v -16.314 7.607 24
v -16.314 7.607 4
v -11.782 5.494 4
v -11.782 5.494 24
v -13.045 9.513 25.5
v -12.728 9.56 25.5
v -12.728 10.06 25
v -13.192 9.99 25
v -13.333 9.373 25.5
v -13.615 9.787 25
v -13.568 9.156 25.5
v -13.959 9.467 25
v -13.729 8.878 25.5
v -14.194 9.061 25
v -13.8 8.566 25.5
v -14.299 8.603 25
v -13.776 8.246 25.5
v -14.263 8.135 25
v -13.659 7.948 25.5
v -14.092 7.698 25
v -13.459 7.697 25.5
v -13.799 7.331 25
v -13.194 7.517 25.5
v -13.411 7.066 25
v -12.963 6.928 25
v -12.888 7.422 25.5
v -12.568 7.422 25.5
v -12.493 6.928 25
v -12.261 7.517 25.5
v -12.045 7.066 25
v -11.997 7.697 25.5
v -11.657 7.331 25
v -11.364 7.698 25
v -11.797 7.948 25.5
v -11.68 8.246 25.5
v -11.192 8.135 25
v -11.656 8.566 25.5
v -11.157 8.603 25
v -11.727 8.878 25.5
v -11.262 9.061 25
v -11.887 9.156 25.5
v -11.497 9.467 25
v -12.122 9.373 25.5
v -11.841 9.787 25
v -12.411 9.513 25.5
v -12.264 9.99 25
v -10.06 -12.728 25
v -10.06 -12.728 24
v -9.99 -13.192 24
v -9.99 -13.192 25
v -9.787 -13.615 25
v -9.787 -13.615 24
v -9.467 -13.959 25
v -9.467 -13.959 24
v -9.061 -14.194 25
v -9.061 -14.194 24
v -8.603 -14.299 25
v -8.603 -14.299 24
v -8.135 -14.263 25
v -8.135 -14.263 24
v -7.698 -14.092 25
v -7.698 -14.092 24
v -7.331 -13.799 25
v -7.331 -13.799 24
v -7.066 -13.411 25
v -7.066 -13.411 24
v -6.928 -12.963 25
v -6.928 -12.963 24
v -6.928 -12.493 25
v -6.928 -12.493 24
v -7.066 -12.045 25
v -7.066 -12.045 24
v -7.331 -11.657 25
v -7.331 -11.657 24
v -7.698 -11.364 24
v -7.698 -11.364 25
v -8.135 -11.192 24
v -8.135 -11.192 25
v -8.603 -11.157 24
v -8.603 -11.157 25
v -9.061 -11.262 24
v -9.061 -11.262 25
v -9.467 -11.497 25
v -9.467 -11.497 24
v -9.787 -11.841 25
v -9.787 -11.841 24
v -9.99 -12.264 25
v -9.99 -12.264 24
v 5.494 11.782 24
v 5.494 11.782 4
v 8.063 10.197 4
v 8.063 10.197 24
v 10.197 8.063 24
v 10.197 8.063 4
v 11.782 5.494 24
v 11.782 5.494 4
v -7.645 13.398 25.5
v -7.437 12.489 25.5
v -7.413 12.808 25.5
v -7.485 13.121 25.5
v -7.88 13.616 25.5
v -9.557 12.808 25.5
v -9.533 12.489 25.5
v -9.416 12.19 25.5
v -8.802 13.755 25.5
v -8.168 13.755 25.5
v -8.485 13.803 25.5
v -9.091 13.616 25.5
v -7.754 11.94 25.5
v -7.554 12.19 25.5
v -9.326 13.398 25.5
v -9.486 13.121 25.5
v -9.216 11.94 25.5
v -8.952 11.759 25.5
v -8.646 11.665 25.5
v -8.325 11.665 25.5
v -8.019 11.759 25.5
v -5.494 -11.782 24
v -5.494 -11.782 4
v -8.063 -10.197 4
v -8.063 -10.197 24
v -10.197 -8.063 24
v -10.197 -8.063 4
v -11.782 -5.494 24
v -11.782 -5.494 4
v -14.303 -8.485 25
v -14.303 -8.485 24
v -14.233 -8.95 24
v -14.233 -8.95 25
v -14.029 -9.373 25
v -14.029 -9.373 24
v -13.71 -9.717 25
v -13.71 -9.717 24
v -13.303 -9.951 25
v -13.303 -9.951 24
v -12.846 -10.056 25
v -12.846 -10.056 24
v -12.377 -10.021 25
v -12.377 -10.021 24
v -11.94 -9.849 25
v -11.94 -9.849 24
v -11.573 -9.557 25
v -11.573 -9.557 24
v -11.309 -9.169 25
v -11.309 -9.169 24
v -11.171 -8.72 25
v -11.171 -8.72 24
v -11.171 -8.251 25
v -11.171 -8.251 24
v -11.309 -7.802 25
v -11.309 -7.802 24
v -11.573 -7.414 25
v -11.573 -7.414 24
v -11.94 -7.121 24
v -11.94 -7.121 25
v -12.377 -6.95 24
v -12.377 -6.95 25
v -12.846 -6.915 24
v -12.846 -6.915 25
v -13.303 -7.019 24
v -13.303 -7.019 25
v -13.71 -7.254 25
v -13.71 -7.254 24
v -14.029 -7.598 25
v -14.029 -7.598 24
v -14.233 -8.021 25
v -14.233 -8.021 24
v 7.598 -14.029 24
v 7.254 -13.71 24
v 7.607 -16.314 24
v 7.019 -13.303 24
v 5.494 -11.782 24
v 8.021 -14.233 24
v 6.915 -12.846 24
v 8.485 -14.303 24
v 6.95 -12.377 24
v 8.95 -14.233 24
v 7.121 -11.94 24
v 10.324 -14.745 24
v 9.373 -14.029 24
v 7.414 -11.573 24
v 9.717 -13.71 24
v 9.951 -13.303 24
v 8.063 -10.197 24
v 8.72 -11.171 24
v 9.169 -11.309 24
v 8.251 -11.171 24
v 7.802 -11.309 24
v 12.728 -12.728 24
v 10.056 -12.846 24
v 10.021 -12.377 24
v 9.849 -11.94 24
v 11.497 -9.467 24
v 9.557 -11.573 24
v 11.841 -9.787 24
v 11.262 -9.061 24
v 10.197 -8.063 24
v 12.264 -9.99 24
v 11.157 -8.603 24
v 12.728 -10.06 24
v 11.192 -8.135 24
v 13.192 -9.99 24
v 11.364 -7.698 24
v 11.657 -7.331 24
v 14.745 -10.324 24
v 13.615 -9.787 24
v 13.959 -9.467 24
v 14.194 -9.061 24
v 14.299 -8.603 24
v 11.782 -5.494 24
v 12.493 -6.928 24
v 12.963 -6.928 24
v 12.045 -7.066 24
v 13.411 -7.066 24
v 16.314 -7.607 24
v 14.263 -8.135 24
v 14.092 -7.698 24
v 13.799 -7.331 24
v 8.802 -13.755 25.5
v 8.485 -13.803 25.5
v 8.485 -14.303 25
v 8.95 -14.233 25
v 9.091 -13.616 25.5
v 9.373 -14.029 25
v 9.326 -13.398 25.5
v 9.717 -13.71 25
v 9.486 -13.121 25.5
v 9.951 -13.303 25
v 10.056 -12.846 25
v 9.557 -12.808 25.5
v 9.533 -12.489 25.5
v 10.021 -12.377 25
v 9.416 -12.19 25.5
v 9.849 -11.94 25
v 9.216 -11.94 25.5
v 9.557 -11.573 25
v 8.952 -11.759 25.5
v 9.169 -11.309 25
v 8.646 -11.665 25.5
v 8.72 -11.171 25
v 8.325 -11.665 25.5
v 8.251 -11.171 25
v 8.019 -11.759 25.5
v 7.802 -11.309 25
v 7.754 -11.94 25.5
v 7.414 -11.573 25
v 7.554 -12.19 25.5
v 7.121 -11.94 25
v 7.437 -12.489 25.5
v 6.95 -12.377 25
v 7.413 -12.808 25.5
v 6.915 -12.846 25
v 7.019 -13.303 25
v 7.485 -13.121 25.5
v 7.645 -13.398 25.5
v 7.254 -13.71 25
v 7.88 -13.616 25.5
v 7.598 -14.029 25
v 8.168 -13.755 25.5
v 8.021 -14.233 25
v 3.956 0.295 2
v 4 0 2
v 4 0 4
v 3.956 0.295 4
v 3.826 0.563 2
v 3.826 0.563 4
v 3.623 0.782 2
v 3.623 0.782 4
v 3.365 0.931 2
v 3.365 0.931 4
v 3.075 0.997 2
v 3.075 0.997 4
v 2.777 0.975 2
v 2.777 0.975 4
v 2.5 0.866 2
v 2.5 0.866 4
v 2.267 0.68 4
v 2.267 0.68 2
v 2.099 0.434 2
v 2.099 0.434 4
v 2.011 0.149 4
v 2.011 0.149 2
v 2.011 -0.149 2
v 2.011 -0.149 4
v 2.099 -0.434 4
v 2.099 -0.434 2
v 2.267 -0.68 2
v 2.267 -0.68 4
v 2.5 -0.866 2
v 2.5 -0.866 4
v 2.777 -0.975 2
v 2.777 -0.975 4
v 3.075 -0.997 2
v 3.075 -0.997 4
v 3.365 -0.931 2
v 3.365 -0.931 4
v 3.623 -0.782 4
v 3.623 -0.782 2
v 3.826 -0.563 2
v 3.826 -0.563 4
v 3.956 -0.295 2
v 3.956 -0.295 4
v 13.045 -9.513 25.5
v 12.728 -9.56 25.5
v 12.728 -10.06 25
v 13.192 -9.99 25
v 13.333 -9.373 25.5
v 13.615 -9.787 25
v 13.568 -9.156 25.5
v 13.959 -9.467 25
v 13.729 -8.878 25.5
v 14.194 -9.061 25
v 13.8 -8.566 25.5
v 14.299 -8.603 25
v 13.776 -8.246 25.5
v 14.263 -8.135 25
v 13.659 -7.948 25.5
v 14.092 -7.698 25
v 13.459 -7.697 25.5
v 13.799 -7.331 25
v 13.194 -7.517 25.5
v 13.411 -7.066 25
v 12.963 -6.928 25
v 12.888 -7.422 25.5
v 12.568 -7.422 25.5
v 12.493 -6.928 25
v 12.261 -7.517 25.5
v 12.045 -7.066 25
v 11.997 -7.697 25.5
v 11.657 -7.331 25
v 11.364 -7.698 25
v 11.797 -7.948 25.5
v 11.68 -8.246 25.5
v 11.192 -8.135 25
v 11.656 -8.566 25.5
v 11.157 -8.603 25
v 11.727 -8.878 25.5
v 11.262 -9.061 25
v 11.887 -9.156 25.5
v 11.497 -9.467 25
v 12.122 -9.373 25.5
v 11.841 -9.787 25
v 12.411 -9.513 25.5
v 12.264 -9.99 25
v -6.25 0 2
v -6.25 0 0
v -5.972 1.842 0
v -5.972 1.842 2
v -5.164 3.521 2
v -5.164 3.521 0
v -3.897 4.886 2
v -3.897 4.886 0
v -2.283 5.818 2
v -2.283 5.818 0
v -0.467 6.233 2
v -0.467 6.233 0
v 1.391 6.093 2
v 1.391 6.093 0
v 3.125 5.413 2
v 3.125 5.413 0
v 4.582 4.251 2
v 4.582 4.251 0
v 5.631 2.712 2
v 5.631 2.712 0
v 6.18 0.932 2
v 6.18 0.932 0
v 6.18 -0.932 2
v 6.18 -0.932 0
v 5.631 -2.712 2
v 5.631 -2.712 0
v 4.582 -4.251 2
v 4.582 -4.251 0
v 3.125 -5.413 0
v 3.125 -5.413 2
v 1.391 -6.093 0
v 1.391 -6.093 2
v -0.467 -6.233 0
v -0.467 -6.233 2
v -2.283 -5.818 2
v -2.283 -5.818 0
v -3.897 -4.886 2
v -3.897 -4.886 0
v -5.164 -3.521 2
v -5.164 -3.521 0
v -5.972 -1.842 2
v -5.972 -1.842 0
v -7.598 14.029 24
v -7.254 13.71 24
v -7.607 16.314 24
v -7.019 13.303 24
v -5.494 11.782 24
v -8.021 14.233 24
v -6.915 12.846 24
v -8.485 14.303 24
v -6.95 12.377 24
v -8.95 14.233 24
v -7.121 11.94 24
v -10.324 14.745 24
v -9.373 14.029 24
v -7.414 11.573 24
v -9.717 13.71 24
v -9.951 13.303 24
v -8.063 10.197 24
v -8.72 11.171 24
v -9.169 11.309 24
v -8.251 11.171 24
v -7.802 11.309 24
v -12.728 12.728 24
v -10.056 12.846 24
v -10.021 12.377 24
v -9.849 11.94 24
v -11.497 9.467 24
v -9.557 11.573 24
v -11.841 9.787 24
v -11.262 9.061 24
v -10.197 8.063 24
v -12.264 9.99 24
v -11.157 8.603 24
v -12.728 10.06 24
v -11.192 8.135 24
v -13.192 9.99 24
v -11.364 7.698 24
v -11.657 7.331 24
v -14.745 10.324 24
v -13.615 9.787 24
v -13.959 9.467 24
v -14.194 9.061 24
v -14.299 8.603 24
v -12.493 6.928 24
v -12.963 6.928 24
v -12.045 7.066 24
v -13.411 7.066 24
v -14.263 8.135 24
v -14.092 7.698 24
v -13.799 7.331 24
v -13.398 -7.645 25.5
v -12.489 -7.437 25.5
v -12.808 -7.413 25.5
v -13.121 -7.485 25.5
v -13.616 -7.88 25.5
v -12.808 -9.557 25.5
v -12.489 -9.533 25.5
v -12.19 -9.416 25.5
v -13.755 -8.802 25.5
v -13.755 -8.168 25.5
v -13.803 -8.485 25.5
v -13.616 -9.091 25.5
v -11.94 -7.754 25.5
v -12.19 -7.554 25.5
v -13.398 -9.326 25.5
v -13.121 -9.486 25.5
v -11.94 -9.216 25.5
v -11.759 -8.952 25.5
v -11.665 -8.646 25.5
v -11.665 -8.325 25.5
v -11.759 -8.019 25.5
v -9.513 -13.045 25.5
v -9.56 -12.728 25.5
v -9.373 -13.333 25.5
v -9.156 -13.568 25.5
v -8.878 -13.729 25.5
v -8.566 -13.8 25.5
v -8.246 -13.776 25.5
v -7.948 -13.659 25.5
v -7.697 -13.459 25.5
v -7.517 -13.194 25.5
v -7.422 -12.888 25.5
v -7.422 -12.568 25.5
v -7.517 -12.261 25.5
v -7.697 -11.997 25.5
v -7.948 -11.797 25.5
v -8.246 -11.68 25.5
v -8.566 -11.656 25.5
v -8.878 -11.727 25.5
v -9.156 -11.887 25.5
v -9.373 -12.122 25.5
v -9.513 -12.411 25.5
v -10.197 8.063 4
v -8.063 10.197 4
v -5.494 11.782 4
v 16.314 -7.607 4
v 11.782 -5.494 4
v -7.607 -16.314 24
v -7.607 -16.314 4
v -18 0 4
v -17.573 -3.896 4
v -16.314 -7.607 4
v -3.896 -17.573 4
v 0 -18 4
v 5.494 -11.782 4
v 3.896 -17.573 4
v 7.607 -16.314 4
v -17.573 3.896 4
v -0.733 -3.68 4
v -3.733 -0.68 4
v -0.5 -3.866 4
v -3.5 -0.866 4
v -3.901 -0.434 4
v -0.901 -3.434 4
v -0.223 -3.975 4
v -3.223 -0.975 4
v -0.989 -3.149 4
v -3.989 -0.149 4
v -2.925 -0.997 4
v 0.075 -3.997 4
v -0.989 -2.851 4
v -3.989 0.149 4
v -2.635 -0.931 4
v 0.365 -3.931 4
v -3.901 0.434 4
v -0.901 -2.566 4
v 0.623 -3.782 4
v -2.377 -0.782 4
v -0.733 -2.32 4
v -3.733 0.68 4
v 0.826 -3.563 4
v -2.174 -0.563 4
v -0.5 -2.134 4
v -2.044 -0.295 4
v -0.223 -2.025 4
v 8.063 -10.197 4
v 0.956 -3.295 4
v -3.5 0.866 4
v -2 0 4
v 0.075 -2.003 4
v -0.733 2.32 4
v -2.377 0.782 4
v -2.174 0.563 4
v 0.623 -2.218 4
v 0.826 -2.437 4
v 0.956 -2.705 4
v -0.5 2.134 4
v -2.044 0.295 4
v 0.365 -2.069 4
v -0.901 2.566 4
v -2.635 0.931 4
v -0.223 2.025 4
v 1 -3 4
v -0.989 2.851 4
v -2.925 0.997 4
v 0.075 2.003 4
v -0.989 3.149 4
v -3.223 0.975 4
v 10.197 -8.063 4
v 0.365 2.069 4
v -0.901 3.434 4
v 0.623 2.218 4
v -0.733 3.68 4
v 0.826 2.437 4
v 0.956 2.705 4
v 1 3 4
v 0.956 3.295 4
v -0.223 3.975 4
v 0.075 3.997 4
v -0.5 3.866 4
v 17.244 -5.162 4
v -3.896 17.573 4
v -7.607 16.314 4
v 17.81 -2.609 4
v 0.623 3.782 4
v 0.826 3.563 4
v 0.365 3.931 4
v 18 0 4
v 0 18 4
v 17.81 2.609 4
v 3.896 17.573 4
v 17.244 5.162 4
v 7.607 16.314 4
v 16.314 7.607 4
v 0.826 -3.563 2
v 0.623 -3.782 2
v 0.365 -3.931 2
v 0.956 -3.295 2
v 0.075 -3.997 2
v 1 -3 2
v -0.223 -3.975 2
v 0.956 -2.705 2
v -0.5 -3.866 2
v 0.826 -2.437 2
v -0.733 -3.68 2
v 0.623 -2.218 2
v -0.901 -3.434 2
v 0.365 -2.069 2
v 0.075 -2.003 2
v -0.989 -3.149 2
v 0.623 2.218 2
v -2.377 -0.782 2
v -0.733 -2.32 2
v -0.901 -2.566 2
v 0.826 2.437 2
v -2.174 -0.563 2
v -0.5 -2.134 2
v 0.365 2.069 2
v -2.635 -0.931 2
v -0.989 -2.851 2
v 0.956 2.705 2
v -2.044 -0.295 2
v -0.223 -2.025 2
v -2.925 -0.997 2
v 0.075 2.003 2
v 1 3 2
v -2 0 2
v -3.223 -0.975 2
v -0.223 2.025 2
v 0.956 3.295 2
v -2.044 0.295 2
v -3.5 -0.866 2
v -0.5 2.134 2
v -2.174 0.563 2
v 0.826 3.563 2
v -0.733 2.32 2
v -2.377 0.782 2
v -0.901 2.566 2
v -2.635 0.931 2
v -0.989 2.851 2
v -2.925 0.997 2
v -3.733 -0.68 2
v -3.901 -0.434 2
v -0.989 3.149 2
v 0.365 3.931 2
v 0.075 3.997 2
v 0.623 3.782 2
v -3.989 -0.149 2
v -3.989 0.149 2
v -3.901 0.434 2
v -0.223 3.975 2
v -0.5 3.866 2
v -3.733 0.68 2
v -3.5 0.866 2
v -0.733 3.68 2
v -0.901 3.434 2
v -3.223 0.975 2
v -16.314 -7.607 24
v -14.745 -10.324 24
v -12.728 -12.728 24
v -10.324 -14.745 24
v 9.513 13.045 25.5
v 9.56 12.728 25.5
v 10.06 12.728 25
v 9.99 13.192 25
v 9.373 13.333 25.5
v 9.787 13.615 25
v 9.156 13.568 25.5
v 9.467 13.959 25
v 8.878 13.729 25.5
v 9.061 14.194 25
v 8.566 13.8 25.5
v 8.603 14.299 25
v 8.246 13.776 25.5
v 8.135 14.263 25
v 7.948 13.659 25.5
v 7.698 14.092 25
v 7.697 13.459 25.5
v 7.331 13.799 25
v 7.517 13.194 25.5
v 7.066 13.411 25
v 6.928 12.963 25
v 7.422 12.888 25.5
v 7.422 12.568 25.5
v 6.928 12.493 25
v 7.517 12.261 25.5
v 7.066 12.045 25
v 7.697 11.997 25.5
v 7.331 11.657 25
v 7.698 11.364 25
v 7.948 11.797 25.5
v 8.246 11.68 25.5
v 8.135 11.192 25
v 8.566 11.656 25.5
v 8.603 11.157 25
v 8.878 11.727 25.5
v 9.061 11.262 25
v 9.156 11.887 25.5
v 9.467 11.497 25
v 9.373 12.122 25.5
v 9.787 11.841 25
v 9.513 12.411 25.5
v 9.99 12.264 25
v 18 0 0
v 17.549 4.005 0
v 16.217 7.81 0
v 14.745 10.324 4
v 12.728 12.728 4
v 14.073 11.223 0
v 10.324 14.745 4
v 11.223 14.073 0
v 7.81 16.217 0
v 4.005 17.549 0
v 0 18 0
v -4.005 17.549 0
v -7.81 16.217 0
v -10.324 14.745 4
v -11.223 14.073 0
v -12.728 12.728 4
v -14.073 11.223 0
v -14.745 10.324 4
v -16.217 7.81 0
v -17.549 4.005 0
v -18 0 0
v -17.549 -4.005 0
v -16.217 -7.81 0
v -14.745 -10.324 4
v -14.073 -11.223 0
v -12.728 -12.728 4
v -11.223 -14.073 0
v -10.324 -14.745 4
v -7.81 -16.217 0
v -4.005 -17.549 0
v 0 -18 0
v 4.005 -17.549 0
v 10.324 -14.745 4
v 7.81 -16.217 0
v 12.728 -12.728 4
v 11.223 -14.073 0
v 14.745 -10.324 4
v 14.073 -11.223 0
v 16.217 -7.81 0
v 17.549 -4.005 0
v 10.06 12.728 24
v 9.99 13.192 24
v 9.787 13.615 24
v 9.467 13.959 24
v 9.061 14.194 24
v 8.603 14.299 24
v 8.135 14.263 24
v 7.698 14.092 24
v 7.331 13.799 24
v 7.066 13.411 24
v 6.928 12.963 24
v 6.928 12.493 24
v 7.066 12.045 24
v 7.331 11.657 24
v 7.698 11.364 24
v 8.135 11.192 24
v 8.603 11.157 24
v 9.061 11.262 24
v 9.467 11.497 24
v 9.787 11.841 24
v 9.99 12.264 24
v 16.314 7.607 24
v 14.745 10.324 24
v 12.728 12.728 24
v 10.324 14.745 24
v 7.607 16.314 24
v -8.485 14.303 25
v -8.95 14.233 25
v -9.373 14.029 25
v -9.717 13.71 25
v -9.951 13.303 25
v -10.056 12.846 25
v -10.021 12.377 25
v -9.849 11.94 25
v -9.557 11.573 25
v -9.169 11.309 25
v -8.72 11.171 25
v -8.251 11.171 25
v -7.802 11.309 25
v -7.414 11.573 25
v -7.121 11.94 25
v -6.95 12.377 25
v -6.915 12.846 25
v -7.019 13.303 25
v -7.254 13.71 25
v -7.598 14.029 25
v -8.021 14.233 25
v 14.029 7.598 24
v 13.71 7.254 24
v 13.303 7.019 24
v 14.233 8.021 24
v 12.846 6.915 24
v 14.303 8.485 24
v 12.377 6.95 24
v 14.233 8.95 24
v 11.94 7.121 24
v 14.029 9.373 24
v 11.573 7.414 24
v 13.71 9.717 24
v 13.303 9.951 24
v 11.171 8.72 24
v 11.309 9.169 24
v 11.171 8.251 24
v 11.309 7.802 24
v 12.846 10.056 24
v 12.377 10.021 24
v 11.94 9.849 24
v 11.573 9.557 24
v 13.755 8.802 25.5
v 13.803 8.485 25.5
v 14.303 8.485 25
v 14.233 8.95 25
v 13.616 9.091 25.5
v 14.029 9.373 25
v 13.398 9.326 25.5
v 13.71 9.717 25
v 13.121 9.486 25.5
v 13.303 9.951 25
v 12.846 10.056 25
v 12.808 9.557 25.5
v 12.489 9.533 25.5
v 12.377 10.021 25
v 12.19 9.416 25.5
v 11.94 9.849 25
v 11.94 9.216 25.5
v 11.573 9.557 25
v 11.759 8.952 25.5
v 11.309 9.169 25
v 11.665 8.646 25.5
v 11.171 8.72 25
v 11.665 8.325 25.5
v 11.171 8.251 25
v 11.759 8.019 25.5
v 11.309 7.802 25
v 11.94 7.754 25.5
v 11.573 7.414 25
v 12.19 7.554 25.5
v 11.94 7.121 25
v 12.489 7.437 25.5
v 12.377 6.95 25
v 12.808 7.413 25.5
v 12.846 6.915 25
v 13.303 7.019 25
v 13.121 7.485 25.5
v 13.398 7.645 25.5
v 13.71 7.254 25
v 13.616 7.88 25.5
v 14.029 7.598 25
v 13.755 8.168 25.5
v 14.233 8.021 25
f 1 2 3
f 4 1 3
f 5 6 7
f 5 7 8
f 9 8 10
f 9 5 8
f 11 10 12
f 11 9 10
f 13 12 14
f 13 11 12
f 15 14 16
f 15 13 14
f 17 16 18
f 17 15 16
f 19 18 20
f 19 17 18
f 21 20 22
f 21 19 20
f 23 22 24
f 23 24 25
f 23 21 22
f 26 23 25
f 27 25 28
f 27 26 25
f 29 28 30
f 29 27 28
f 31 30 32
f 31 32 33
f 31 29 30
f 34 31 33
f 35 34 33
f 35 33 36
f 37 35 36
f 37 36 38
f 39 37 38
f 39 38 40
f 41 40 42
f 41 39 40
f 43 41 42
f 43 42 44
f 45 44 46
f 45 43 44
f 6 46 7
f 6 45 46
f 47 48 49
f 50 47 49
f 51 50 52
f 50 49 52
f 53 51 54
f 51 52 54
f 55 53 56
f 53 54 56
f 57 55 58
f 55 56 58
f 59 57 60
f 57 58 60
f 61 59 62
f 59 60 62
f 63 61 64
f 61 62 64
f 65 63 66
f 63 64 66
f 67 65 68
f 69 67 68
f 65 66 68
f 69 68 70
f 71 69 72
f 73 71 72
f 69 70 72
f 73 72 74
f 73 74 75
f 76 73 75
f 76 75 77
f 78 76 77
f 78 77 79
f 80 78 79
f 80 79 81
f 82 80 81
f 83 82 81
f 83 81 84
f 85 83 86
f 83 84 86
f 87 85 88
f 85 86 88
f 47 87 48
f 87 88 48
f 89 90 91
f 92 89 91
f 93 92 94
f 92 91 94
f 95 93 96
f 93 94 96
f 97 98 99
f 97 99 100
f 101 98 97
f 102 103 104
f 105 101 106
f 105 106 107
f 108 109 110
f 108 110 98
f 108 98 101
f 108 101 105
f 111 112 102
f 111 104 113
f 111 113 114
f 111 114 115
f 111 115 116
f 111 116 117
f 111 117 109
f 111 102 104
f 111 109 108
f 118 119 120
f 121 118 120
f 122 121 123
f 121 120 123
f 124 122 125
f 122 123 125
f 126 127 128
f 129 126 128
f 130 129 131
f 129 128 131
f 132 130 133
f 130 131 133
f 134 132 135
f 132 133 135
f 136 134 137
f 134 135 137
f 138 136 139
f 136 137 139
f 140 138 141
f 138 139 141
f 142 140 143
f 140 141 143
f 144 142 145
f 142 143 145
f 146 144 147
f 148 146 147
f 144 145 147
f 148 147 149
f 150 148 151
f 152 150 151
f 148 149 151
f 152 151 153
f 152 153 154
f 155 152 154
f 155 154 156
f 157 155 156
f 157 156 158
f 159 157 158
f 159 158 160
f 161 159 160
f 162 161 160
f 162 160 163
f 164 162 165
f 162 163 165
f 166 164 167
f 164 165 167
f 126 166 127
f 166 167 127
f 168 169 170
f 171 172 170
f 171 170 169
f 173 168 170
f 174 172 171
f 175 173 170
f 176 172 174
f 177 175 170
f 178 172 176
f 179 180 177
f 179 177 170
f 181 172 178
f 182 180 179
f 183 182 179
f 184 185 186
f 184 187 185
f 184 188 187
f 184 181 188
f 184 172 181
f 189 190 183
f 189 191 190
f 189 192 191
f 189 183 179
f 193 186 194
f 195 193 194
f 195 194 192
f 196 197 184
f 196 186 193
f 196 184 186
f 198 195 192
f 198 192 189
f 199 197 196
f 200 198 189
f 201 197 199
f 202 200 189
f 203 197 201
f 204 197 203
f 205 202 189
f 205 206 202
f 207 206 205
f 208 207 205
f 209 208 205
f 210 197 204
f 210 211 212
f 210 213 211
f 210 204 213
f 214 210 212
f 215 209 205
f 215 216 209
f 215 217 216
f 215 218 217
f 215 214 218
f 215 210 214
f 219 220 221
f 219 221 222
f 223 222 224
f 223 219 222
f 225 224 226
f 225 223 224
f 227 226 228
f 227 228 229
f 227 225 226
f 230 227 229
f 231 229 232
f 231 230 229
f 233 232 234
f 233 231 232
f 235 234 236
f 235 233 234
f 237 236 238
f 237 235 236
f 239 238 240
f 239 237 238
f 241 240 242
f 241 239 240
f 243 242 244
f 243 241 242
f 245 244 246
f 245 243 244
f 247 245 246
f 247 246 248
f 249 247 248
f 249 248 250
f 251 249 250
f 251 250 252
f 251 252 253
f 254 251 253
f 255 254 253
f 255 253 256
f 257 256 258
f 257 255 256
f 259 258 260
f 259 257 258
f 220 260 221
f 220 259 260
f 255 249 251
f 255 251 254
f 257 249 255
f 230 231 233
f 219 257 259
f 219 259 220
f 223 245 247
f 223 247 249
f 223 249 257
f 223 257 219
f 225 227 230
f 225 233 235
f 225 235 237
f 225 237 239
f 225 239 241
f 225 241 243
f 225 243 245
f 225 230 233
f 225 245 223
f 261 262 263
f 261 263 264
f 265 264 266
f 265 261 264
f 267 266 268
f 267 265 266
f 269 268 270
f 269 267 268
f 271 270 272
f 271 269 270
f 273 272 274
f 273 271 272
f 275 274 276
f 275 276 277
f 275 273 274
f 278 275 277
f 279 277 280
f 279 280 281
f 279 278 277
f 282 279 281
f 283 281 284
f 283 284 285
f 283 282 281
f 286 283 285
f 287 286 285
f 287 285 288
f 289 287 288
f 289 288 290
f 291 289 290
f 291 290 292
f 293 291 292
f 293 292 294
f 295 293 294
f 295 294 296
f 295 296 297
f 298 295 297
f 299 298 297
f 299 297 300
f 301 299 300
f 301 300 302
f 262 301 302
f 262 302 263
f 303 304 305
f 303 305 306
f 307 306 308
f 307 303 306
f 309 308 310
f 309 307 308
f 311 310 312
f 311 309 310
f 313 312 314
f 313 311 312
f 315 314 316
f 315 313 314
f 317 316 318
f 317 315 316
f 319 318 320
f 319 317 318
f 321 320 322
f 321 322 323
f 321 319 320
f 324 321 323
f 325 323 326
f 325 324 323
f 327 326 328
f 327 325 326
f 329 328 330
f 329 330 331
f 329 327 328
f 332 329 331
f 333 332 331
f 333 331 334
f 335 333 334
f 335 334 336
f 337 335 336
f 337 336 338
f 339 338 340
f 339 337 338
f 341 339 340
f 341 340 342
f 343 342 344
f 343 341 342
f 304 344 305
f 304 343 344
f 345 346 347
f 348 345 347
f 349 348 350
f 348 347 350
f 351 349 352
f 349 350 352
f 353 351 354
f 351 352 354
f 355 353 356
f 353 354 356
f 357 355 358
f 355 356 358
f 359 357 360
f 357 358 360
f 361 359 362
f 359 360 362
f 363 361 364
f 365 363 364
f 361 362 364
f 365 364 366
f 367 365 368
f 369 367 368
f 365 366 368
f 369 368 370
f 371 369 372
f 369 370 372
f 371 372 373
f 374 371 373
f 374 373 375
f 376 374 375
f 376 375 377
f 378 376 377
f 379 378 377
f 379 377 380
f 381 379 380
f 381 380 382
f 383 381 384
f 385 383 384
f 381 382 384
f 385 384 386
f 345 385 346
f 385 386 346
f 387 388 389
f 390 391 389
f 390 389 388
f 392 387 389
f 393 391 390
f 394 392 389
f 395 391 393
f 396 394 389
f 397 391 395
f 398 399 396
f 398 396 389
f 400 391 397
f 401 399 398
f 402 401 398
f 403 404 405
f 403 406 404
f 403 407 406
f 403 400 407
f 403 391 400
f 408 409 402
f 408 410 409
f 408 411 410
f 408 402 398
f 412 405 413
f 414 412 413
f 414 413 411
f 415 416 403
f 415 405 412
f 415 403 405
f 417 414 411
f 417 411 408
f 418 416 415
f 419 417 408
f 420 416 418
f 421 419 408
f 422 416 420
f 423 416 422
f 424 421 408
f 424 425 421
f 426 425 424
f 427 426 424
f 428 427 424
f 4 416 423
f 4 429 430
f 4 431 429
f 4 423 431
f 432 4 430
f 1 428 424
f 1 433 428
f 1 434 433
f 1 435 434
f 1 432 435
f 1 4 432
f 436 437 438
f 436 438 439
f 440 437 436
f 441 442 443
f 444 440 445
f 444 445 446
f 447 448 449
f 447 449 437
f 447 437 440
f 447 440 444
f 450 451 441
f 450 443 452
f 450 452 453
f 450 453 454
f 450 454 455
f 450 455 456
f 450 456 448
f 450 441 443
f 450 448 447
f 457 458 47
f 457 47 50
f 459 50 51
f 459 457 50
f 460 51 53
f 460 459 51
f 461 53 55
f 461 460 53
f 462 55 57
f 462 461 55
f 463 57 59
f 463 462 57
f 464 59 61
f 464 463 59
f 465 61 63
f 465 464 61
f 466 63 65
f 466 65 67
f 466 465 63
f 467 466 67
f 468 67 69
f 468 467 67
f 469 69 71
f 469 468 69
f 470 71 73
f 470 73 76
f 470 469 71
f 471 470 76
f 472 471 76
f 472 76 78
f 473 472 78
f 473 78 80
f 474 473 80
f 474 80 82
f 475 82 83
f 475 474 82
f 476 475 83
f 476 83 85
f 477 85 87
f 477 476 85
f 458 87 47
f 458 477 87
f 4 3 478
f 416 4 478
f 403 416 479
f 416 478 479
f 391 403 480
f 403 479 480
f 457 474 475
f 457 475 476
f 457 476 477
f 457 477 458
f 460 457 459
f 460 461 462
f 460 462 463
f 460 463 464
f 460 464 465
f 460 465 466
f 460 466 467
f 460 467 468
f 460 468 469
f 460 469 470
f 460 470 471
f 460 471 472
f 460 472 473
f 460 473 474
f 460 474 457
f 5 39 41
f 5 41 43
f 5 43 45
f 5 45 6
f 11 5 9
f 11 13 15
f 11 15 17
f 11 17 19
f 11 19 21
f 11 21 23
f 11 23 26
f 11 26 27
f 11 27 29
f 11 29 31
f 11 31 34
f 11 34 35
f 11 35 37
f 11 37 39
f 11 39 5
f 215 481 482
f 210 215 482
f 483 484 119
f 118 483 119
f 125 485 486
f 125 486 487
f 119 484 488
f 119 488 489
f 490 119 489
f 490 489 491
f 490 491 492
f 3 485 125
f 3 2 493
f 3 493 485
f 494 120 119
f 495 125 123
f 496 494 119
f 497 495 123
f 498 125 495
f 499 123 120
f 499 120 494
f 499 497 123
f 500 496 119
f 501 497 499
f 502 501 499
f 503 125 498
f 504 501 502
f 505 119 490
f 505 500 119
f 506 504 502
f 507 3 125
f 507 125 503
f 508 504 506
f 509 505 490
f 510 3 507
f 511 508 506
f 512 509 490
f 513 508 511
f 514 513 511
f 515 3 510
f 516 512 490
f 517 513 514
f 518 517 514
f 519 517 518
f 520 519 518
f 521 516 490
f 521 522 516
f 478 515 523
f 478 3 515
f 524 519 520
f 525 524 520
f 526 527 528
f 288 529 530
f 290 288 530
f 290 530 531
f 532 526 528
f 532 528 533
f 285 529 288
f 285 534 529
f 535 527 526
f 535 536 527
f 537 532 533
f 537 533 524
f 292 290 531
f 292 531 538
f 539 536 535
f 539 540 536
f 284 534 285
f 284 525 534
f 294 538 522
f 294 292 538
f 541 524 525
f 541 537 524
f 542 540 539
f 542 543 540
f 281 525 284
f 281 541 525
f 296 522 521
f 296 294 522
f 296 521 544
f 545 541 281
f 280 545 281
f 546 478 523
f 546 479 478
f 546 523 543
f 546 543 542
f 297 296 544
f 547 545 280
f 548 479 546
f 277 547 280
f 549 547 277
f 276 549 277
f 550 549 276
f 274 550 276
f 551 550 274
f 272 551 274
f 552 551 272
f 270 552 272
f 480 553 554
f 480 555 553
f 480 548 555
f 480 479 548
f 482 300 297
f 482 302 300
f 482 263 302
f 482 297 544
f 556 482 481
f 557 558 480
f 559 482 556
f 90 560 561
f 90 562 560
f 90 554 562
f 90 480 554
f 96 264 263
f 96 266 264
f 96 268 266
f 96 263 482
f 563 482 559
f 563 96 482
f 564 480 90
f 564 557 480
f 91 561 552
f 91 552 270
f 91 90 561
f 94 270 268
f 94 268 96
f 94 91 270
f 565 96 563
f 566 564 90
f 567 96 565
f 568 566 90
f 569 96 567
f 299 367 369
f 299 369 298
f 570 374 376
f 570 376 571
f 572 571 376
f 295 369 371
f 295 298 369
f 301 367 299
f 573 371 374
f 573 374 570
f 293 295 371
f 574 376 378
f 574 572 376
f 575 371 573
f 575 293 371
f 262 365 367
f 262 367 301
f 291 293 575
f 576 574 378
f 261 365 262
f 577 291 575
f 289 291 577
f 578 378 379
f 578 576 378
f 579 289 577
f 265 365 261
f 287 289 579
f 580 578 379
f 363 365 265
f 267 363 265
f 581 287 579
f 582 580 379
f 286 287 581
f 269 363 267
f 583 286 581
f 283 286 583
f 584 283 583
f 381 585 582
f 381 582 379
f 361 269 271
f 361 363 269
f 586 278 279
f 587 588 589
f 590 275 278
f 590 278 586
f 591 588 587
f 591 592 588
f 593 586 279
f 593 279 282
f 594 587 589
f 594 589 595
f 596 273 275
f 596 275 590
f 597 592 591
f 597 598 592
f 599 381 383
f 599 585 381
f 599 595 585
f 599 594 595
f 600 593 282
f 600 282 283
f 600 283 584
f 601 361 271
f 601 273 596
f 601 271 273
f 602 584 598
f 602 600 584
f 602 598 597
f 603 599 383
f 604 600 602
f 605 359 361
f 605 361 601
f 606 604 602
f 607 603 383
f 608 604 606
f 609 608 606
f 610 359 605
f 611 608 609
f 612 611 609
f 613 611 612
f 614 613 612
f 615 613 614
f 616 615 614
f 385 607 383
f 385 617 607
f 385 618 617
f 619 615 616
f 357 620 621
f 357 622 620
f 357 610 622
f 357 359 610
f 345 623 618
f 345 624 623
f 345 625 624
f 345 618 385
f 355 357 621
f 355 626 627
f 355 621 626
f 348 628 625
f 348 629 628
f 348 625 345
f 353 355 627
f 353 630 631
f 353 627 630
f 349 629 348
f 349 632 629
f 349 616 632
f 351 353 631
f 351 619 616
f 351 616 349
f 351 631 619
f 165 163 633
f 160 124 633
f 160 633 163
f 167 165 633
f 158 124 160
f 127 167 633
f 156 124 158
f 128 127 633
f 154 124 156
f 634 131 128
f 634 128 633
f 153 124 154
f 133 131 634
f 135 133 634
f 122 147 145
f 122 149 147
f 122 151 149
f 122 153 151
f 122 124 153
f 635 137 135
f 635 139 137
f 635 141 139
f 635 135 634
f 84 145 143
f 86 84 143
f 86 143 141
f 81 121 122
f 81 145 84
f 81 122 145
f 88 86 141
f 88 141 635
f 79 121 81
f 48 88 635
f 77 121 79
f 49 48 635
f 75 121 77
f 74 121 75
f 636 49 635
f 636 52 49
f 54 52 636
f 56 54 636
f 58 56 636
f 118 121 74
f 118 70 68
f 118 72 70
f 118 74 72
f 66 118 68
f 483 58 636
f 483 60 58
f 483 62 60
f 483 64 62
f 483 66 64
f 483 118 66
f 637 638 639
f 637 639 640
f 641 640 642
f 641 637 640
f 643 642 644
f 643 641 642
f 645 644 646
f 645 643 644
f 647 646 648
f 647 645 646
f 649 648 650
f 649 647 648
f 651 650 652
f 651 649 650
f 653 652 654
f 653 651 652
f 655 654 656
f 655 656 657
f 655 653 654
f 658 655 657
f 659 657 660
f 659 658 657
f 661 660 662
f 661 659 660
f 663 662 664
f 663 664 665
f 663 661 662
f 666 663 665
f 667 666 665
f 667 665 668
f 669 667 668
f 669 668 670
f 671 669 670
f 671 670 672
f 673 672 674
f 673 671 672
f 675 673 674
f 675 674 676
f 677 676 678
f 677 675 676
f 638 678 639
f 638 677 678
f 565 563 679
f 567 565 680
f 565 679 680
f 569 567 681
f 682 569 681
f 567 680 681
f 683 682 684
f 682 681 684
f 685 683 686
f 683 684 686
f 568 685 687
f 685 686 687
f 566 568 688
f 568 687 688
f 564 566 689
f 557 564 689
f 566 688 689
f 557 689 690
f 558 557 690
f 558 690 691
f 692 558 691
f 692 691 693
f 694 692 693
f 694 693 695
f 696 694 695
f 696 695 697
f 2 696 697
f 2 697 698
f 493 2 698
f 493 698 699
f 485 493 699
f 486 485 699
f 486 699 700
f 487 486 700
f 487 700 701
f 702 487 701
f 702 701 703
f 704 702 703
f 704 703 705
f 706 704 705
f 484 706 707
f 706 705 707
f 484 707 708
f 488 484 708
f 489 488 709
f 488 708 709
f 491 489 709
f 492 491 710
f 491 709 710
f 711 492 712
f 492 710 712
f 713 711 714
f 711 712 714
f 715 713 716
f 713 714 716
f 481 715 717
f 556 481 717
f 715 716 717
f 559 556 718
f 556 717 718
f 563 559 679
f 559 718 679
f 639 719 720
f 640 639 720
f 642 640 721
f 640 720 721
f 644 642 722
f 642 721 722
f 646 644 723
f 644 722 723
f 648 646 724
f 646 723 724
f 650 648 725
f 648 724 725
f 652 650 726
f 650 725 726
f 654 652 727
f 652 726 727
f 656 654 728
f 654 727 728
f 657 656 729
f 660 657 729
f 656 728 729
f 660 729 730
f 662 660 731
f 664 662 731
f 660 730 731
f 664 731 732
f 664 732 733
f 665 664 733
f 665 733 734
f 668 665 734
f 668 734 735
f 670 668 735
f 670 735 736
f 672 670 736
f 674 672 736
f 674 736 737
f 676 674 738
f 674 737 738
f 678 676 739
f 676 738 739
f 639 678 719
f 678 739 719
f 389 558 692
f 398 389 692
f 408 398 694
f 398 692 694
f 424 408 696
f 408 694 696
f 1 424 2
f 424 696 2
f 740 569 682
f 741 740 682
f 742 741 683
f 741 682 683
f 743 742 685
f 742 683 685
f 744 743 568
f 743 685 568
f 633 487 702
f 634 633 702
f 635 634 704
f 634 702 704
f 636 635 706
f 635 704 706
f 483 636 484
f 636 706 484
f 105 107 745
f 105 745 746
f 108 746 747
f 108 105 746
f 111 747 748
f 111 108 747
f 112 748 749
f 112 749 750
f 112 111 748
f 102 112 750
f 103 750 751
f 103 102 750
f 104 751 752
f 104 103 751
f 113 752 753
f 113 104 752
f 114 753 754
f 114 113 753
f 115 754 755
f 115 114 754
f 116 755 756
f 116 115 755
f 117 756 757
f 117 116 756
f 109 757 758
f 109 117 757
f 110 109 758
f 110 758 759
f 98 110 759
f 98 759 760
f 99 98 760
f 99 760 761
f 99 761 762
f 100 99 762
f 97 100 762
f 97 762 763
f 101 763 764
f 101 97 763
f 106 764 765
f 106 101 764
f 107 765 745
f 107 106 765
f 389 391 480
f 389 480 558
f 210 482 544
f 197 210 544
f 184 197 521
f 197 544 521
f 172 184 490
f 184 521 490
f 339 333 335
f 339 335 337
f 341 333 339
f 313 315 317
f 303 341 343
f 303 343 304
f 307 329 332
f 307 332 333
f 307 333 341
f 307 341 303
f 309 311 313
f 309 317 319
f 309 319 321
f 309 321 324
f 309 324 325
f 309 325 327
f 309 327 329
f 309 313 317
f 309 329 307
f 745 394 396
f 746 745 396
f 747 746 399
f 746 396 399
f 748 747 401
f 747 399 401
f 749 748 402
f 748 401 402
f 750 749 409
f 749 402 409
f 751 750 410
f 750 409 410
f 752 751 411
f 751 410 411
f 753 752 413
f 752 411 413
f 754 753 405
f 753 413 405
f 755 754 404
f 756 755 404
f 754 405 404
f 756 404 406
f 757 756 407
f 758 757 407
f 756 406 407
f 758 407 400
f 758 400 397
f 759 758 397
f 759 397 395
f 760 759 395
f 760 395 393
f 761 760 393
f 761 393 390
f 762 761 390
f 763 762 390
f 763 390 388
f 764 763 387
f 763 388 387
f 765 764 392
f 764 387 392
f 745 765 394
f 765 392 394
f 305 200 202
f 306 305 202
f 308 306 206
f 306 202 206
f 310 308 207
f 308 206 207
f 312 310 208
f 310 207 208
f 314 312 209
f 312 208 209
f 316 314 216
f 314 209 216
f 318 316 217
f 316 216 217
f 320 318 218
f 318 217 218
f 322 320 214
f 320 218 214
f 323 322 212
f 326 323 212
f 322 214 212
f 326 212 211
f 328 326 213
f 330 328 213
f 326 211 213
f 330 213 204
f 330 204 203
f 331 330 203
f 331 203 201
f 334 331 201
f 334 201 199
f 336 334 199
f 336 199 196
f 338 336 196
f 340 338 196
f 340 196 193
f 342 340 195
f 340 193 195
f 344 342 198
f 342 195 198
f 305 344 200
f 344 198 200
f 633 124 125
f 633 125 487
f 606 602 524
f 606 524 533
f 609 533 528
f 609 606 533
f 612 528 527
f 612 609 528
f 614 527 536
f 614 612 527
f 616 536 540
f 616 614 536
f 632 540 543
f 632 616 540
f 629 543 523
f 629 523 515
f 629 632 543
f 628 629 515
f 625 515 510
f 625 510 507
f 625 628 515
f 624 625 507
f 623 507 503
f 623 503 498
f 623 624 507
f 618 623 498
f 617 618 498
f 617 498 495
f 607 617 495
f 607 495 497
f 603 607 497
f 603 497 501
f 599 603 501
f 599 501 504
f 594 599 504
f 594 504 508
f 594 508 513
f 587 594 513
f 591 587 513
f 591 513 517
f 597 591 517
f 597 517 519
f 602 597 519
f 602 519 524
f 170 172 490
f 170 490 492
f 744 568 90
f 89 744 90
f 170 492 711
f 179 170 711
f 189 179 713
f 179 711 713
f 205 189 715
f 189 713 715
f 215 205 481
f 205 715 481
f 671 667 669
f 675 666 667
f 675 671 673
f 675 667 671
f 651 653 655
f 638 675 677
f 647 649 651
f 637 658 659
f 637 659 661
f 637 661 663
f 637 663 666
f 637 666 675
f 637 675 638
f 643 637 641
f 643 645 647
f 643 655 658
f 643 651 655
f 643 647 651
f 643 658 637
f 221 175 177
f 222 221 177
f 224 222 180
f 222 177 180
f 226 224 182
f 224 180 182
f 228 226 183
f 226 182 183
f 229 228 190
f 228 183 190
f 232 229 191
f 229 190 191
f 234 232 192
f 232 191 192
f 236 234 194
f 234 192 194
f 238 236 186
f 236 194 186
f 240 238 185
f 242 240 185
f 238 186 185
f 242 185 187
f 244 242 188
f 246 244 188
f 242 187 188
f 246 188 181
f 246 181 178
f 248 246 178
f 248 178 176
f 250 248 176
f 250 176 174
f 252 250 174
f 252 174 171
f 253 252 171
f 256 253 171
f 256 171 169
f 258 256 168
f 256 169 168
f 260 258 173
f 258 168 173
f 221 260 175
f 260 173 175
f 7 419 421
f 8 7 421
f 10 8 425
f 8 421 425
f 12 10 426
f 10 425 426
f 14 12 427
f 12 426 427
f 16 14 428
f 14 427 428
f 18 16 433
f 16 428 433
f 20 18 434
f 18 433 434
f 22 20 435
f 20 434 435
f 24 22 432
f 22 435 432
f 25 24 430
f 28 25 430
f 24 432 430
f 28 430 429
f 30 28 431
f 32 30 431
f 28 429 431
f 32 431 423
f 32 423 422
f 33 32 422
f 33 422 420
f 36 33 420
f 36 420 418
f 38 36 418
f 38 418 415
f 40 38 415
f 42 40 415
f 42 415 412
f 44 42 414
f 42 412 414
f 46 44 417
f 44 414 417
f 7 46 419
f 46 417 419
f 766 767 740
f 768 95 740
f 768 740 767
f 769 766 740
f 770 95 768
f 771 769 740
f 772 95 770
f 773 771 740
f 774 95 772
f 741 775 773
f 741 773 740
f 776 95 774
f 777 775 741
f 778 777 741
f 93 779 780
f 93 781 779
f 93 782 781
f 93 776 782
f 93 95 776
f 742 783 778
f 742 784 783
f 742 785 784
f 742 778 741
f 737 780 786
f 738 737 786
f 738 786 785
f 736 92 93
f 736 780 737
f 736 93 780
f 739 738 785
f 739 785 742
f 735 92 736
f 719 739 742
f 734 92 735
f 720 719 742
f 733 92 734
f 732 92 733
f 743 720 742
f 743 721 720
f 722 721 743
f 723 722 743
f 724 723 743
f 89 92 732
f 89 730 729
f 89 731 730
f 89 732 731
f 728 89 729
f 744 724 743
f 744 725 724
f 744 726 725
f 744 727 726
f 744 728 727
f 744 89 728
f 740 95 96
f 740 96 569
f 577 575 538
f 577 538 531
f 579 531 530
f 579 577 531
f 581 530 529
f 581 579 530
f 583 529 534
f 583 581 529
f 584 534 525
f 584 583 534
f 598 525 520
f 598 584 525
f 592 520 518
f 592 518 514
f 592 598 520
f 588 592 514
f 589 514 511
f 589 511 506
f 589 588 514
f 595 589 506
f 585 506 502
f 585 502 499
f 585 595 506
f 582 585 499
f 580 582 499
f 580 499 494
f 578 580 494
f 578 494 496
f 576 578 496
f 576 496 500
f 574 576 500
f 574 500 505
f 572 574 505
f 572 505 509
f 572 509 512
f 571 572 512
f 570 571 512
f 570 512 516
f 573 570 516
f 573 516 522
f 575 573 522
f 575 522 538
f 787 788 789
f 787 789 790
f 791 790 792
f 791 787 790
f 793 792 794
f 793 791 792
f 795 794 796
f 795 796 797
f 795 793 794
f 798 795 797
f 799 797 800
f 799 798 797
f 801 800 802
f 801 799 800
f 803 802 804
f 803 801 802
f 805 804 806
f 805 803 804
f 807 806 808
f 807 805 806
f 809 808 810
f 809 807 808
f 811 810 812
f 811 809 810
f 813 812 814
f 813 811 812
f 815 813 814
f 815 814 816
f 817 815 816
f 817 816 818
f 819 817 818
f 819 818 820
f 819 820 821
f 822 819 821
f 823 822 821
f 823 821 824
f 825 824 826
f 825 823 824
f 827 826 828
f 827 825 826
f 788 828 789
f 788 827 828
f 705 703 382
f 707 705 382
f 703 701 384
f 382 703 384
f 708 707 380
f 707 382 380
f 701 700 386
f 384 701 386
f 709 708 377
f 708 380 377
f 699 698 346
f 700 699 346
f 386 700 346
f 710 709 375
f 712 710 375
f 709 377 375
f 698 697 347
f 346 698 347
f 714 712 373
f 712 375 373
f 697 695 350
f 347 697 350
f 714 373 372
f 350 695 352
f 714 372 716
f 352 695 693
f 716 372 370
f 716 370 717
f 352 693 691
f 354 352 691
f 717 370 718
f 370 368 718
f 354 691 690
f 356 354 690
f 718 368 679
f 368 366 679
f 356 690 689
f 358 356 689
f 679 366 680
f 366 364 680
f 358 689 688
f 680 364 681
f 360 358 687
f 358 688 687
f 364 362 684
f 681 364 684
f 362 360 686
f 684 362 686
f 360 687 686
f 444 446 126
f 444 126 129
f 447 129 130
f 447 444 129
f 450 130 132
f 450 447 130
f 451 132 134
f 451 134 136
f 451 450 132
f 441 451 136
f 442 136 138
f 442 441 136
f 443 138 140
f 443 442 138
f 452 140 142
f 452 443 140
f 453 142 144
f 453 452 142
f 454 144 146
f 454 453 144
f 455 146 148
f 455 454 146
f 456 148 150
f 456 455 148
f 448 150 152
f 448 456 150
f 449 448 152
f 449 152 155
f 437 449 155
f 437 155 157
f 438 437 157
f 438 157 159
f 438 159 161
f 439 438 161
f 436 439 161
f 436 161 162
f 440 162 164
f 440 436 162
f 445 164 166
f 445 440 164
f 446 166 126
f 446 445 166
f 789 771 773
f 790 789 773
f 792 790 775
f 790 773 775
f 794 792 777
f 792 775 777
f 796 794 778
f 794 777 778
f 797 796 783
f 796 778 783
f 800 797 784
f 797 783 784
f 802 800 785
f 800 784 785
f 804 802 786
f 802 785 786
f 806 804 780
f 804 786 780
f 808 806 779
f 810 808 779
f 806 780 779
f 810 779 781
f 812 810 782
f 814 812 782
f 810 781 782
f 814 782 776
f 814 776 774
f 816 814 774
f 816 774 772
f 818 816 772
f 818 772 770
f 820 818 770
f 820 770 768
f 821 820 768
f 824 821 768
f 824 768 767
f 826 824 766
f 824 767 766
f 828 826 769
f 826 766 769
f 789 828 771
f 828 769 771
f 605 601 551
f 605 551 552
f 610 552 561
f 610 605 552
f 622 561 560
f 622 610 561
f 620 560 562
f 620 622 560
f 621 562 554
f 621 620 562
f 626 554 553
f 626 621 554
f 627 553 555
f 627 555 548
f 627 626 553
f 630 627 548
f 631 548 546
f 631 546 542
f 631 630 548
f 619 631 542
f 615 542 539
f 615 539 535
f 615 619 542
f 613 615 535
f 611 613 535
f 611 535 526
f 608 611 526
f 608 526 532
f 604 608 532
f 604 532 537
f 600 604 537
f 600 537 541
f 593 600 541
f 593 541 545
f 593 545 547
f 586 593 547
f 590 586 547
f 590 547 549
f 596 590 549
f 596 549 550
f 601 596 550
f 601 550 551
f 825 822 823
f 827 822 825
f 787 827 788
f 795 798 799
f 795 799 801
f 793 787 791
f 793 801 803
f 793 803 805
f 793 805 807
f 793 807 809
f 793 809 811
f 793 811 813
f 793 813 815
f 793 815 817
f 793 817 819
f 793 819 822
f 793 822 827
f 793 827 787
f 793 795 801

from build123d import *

# Parameters (mm, degrees)
SKETCH_1_R               = 18
SKETCH_1_R_2             = 1
EXTRUDE_1_DEPTH          = 4
EXTRUDE_2_DEPTH          = 20
PATTERN_CIRCULAR_1_COUNT = 4
SKETCH_3_R               = 1.575
EXTRUDE_3_DEPTH          = 1.5
PATTERN_CIRCULAR_2_COUNT = 4
SKETCH_4_R               = 6.25
CUT_EXTRUDE_1_DEPTH      = 2
CHAMFER_1_SIZE           = 0.5


with BuildPart() as part:
    # ｽｹｯﾁ1 → ﾎﾞｽ - 押し出し1 (new body)
    with BuildSketch(Plane.XY):
        Circle(SKETCH_1_R)
        with Locations((0, 3)):
            Circle(SKETCH_1_R_2, mode=Mode.SUBTRACT)
        with Locations((3, 0)):
            Circle(SKETCH_1_R_2, mode=Mode.SUBTRACT)
        with Locations((0, -3)):
            Circle(SKETCH_1_R_2, mode=Mode.SUBTRACT)
        with Locations((-3, 0)):
            Circle(SKETCH_1_R_2, mode=Mode.SUBTRACT)
    extrude(amount=EXTRUDE_1_DEPTH)

    # ｽｹｯﾁ2 → ﾎﾞｽ - 押し出し2 (add)
    with BuildSketch(Plane.XY.offset(4)):
        with BuildLine():
            Line((16.313540167, -7.607128711), (11.782001231, -5.494037403))
            ThreePointArc((11.782001231, -5.494037403), (9.192388155, -9.192388155), (5.494037403, -11.782001231))
            Line((5.494037403, -11.782001231), (7.607128711, -16.313540167))
            ThreePointArc((7.607128711, -16.313540167), (12.727922061, -12.727922061), (16.313540167, -7.607128711))
        make_face()
    extrude_2 = extrude(amount=EXTRUDE_2_DEPTH)

    # 円形ﾊﾟﾀｰﾝ1: ﾎﾞｽ - 押し出し2 ×4 about axis
    pattern_circular_1_axis = Axis((0, 0, 24), (0, 0, -1))
    for i in range(1, PATTERN_CIRCULAR_1_COUNT):
        add(extrude_2.rotate(pattern_circular_1_axis, i * 360 / PATTERN_CIRCULAR_1_COUNT))

    # ｽｹｯﾁ3 → ﾎﾞｽ - 押し出し3 (add)
    with BuildSketch(Plane.XY.offset(24)):
        with Locations((8.485281374, 12.727922061)):
            Circle(SKETCH_3_R)
        with Locations((12.727922061, 8.485281374)):
            Circle(SKETCH_3_R)
    extrude_3 = extrude(amount=EXTRUDE_3_DEPTH)

    # 円形ﾊﾟﾀｰﾝ2: ﾎﾞｽ - 押し出し3 ×4 about axis
    pattern_circular_2_axis = Axis((0, 0, 0), (0, 0, 1))
    for i in range(1, PATTERN_CIRCULAR_2_COUNT):
        add(extrude_3.rotate(pattern_circular_2_axis, i * 360 / PATTERN_CIRCULAR_2_COUNT))

    # ｽｹｯﾁ4 → ｶｯﾄ - 押し出し1 (cut)
    with BuildSketch(Plane(origin=(0, 0, 0), x_dir=(-1, 0, 0), z_dir=(0, 0, -1))):
        Circle(SKETCH_4_R)
    extrude(amount=-CUT_EXTRUDE_1_DEPTH, mode=Mode.SUBTRACT)

    # 面取り1
    chamfer_1_edges = [part.edges().sort_by_distance(p)[0] for p in [
        (6.910281374, 12.727922061, 25.5),
        (11.152922061, 8.485281374, 25.5),
        (12.727922061, -6.910281374, 25.5),
        (8.485281374, -11.152922061, 25.5),
        (-6.910281374, -12.727922061, 25.5),
        (-11.152922061, -8.485281374, 25.5),
        (-12.727922061, 6.910281374, 25.5),
        (-8.485281374, 11.152922061, 25.5),
    ]]
    chamfer(chamfer_1_edges, length=CHAMFER_1_SIZE)


solid = part.part
